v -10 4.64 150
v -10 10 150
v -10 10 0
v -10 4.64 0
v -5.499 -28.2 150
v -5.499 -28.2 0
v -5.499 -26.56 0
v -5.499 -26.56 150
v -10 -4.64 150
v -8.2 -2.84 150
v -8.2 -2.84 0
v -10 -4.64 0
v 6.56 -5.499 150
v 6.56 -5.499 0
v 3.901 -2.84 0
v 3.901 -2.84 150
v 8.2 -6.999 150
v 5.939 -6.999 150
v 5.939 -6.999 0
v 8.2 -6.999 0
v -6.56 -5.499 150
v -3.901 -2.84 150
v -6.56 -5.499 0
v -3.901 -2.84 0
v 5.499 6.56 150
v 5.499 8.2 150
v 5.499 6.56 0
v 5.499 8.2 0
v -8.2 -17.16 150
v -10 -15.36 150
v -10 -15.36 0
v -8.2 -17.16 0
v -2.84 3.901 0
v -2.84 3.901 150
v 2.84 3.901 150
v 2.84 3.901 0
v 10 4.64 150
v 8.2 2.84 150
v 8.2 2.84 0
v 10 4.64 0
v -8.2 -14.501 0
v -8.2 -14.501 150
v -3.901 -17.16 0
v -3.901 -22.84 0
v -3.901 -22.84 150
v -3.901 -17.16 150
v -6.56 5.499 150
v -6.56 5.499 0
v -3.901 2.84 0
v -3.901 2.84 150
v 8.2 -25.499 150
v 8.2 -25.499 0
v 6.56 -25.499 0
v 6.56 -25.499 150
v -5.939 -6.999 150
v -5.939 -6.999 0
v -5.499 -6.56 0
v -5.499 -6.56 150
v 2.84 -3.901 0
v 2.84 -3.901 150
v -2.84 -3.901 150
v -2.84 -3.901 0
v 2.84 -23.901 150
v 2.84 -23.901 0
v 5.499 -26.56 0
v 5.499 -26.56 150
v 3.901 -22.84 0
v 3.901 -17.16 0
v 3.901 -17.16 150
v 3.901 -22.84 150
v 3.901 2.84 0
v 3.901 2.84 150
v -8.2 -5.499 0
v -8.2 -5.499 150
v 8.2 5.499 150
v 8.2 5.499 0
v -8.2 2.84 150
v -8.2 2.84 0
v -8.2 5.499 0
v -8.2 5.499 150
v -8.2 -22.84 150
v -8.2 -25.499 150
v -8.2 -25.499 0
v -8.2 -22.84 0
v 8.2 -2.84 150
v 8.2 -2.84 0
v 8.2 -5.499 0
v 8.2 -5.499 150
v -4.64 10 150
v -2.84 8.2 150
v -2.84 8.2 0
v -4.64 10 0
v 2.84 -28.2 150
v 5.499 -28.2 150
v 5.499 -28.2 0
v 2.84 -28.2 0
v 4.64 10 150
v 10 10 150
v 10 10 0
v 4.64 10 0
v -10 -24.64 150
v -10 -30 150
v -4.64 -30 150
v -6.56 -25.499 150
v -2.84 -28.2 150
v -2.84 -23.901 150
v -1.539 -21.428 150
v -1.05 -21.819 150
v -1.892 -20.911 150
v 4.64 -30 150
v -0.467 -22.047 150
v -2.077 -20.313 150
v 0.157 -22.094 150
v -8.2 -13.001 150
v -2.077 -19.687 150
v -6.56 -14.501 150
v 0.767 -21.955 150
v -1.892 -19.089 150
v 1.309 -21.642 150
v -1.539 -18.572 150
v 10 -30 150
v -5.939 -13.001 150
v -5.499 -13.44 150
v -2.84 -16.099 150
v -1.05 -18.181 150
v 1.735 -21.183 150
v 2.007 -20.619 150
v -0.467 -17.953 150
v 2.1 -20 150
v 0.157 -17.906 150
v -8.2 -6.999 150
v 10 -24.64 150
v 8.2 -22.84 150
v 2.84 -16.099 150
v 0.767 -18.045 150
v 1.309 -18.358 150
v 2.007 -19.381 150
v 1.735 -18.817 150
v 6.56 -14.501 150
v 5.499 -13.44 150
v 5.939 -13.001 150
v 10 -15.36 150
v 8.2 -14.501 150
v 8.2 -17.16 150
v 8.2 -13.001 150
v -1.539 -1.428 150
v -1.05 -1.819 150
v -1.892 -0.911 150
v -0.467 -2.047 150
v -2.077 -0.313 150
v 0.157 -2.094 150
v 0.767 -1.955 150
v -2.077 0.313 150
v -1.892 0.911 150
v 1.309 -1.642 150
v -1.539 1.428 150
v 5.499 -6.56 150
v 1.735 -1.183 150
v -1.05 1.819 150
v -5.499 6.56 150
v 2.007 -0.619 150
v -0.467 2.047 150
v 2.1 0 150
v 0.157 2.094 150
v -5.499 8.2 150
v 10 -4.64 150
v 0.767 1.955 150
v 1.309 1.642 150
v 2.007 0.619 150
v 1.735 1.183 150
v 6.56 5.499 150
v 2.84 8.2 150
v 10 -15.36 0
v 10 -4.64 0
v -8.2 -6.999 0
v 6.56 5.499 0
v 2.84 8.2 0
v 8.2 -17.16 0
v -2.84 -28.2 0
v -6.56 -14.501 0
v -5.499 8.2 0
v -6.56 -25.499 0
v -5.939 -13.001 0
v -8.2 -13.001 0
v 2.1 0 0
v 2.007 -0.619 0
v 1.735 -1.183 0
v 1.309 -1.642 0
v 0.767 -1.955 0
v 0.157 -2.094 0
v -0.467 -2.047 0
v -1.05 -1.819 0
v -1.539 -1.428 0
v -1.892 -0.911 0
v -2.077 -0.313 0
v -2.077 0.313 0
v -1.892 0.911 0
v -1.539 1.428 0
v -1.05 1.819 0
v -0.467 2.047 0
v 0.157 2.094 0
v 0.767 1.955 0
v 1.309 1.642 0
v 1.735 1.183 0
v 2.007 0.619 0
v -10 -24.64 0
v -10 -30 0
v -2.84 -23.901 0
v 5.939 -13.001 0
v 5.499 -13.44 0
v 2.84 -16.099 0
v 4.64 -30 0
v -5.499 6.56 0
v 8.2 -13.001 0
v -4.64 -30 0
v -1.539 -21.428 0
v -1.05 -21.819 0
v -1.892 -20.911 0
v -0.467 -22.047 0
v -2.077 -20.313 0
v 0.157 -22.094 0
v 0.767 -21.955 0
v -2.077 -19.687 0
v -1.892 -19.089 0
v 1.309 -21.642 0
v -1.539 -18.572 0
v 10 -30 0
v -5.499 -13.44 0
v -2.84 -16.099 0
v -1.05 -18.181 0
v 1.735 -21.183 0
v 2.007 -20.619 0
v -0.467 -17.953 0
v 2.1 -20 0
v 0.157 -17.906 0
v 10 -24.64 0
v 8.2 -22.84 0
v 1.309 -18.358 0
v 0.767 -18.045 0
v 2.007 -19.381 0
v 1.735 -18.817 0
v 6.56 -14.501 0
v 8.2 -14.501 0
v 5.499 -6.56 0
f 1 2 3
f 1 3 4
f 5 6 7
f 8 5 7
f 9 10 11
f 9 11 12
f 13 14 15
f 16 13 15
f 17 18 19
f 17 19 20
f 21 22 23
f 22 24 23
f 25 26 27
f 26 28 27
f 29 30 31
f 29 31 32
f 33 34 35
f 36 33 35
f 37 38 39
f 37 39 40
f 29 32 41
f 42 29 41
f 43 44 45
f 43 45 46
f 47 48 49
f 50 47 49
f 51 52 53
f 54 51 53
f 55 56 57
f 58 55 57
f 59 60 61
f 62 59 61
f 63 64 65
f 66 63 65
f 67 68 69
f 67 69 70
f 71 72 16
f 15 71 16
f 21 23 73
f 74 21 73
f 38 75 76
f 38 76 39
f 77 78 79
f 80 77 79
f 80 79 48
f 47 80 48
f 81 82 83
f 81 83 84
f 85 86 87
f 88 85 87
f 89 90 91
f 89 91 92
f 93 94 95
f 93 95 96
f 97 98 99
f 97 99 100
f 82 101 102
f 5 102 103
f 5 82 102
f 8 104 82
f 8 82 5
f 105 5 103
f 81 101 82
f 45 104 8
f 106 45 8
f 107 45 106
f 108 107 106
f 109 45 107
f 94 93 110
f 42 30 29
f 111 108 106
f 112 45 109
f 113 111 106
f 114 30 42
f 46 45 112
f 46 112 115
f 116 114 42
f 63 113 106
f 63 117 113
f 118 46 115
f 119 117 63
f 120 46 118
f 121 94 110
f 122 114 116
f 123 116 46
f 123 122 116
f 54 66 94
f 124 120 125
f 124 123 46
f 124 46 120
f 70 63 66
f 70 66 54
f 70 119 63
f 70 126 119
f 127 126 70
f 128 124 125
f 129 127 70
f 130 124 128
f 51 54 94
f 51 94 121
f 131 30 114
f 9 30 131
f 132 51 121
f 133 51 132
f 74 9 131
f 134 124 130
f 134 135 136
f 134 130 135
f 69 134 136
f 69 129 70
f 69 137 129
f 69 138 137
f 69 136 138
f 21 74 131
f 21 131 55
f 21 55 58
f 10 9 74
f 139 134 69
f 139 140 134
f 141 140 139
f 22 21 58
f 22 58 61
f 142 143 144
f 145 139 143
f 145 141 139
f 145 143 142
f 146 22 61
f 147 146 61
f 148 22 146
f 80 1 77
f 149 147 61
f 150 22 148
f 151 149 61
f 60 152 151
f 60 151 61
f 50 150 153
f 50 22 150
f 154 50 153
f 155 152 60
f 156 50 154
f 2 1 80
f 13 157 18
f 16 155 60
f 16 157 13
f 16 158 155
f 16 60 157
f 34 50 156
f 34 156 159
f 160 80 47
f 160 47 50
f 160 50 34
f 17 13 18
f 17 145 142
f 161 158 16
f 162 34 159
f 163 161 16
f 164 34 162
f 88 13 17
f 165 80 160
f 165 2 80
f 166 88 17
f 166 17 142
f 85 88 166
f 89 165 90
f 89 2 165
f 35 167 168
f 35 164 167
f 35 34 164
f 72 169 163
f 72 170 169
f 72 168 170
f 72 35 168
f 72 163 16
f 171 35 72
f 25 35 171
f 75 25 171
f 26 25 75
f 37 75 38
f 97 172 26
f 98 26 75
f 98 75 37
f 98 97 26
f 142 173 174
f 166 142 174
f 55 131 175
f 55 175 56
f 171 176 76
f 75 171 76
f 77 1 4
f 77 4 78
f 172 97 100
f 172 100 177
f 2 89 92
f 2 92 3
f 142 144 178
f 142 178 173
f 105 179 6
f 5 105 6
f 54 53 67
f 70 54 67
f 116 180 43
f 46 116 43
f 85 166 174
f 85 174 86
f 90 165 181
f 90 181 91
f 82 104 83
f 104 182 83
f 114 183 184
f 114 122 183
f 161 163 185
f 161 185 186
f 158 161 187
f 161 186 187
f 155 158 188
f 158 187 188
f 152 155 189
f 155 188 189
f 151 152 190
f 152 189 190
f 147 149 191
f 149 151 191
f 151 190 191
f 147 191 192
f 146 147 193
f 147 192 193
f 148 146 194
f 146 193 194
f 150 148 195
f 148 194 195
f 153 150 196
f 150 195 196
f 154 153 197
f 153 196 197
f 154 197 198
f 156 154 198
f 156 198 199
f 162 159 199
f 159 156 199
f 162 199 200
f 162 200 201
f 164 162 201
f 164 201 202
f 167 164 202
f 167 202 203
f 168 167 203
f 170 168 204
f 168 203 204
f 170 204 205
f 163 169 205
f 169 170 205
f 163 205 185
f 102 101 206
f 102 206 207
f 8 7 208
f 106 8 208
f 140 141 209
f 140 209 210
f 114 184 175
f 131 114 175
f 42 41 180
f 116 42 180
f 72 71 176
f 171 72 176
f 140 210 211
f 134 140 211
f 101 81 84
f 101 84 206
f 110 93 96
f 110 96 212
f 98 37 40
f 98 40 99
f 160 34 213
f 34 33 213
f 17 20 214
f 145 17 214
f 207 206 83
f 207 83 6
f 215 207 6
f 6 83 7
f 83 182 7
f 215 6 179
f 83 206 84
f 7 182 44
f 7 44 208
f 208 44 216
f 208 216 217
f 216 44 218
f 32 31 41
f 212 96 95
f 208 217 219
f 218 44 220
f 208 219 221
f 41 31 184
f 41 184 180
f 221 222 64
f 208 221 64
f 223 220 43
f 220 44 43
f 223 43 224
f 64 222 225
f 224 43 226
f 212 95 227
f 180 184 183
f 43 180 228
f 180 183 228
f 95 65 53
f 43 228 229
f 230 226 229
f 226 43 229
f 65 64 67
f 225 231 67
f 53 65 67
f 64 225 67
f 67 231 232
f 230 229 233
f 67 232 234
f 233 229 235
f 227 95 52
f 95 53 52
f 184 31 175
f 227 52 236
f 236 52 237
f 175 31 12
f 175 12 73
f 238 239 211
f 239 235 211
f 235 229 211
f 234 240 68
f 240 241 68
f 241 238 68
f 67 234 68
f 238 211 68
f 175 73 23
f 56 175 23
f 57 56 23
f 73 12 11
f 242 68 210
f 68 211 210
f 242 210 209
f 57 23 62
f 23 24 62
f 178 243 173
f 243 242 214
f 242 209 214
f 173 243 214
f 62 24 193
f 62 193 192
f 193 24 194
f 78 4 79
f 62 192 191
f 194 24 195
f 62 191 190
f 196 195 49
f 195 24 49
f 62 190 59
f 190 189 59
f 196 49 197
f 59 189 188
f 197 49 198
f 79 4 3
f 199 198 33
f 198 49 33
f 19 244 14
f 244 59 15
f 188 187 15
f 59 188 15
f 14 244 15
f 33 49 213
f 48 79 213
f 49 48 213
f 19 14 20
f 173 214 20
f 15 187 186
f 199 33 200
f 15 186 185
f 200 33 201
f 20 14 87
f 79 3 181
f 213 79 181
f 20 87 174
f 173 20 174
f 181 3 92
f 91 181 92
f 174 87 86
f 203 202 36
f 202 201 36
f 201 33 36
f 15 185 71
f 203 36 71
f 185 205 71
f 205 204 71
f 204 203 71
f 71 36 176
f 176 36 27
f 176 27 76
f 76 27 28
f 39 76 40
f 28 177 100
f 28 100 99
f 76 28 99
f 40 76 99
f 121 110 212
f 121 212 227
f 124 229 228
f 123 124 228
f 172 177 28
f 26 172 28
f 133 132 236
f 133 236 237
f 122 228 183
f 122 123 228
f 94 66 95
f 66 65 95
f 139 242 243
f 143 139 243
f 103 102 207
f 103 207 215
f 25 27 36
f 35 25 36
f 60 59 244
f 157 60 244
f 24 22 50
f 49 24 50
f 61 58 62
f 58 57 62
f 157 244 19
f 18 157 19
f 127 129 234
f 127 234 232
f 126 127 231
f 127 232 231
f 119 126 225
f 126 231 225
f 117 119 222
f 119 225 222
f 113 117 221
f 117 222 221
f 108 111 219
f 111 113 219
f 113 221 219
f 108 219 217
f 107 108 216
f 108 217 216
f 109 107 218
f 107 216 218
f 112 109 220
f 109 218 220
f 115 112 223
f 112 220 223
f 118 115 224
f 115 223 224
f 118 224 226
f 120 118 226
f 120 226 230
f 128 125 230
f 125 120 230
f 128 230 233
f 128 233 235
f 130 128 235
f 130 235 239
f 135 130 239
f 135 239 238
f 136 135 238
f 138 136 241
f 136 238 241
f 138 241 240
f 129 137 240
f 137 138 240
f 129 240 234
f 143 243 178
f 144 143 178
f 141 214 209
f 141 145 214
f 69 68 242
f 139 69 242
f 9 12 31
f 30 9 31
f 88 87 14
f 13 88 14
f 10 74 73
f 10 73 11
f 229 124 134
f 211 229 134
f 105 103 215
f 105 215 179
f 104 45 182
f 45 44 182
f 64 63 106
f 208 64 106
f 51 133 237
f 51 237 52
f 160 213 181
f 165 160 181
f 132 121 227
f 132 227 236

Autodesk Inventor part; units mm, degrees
ref_plane "YZ Plane" through (0, 0, 0) normal (1, 0, 0) x (0, 1, 0)
ref_plane "XY Plane" through (0, 0, 0) normal (0, 0, 1) x (1, 0, 0)
sketch "Sketch1" plane through (0, 0, 0) normal (0, 0, 1) x (1, 0, 0)
  line L0 (-3.9007, 3.9007) -> (3.9007, 3.9007)
  line L1 (3.9007, 3.9007) -> (3.9007, -3.9007)
  line L2 (3.9007, -3.9007) -> (-3.9007, -3.9007)
  line L3 (-3.9007, -3.9007) -> (-3.9007, 3.9007)
  line L4 (0, 3.9007) -> (0, -3.9007) construction
  line L5 (-3.9007, 0) -> (3.9007, 0) construction
  circle A0 centre (0, 0) radius 2.1
  line L6 (0, 0) -> (-16.1173, 16.1173) construction
  line L7 (0, 0) -> (22.7933, 0) construction
  line L8 (-2.84, 3.9007) -> (-5.4993, 6.56)
  line L9 (-5.4993, 6.56) -> (-5.4993, 8.2)
  line L10 (-5.4993, 8.2) -> (-2.84, 8.2)
  line L11 (-2.84, 8.2) -> (-4.64, 10)
  line L12 (-4.64, 10) -> (-10, 10)
  line L13 (-10, 10) -> (-10, 4.64)
  line L14 (-10, 4.64) -> (-8.2, 2.84)
  line L15 (-8.2, 2.84) -> (-8.2, 5.4993)
  line L16 (-8.2, 5.4993) -> (-6.56, 5.4993)
  line L17 (-6.56, 5.4993) -> (-3.9007, 2.84)
  line L18 (-3.9007, 2.84) -> (-11.3102, 2.84) construction
  line L19 (-2.84, 3.9007) -> (-3.9007, 3.9007)
  line L20 (-3.9007, 2.84) -> (-3.9007, 3.9007)
  line L21 (-3.9007, -2.84) -> (-6.56, -5.4993)
  line L22 (-6.56, -5.4993) -> (-8.2, -5.4993)
  line L23 (-8.2, -5.4993) -> (-8.2, -2.84)
  line L24 (-8.2, -2.84) -> (-10, -4.64)
  line L25 (-10, -4.64) -> (-10, -10)
  line L26 (-10, -10) -> (-4.64, -10)
  line L27 (-4.64, -10) -> (-2.84, -8.2)
  line L28 (-2.84, -8.2) -> (-5.4993, -8.2)
  line L29 (-5.4993, -8.2) -> (-5.4993, -6.56)
  line L30 (-5.4993, -6.56) -> (-2.84, -3.9007)
  line L31 (-3.9007, -2.84) -> (-3.9007, -3.9007)
  line L32 (-2.84, -3.9007) -> (-3.9007, -3.9007)
  line L33 (2.84, -3.9007) -> (5.4993, -6.56)
  line L34 (5.4993, -6.56) -> (5.4993, -8.2)
  line L35 (5.4993, -8.2) -> (2.84, -8.2)
  line L36 (2.84, -8.2) -> (4.64, -10)
  line L37 (4.64, -10) -> (10, -10)
  line L38 (10, -10) -> (10, -4.64)
  line L39 (10, -4.64) -> (8.2, -2.84)
  line L40 (8.2, -2.84) -> (8.2, -5.4993)
  line L41 (8.2, -5.4993) -> (6.56, -5.4993)
  line L42 (6.56, -5.4993) -> (3.9007, -2.84)
  line L43 (2.84, -3.9007) -> (3.9007, -3.9007)
  line L44 (3.9007, -2.84) -> (3.9007, -3.9007)
  line L45 (3.9007, 2.84) -> (6.56, 5.4993)
  line L46 (6.56, 5.4993) -> (8.2, 5.4993)
  line L47 (8.2, 5.4993) -> (8.2, 2.84)
  line L48 (8.2, 2.84) -> (10, 4.64)
  line L49 (10, 4.64) -> (10, 10)
  line L50 (10, 10) -> (4.64, 10)
  line L51 (4.64, 10) -> (2.84, 8.2)
  line L52 (2.84, 8.2) -> (5.4993, 8.2)
  line L53 (5.4993, 8.2) -> (5.4993, 6.56)
  line L54 (5.4993, 6.56) -> (2.84, 3.9007)
  line L55 (3.9007, 2.84) -> (3.9007, 3.9007)
  line L56 (2.84, 3.9007) -> (3.9007, 3.9007)
  dimension "d7" = 4.2
  dimension "d8" = 135
  dimension "d9" = 1.5
  dimension "d10" = 1.64
  dimension "d11" = 1.8
  dimension "d12" = 2.84
  dimension "d13" = 10
  dimension "d16" = 360
extrude "Extrusion1" add sketch "Sketch1" along normal blind 150
pattern_linear "Rectangular Pattern1" count 2 spacing 20 along (0, -1, 0) of "Extrusion1"
sketch "Sketch2" plane through (0, 0, 150) normal (0, 0, 1) x (1, 0, 0)
  line L0 (8.2, -2.84) -> (8.2, -5.4993) projected
  line L1 (8.2, -5.4993) -> (6.56, -5.4993) projected
  line L2 (-6.56, -5.4993) -> (-8.2, -5.4993) projected
  line L3 (-8.2, -5.4993) -> (-8.2, -2.84) projected
  line L4 (-8.2, -14.5007) -> (-6.56, -14.5007) projected
  line L5 (6.56, -14.5007) -> (8.2, -14.5007) projected
  line L6 (5.4993, -11.8) -> (5.4993, -13.44) projected
  line L7 (5.4993, -13.44) -> (2.84, -16.0993) projected
  line L8 (-2.84, -16.0993) -> (-5.4993, -13.44) projected
  line L9 (-5.4993, -8.2) -> (-5.4993, -6.56) projected
  line L10 (-5.4993, -6.56) -> (-2.84, -3.9007) projected
  line L11 (2.84, -3.9007) -> (5.4993, -6.56) projected
  line L12 (2.84, -8.2) -> (4.64, -10) projected
  line L13 (-8.2, -6.9993) -> (-5.9387, -6.9993)
  line L14 (-5.9387, -6.9993) -> (-4.1231, -5.1837)
  line L15 (-4.1231, -5.1837) -> (4.1231, -5.1837)
  line L16 (4.1231, -5.1837) -> (5.9387, -6.9993)
  line L17 (5.9387, -6.9993) -> (8.2, -6.9993)
  line L18 (8.2, -6.9993) -> (8.2, -13.0007)
  line L19 (8.2, -13.0007) -> (5.9387, -13.0007)
  line L20 (5.9387, -13.0007) -> (4.2461, -14.6932)
  line L21 (4.2461, -14.6932) -> (-4.2461, -14.6932)
  line L22 (-4.2461, -14.6932) -> (-5.9387, -13.0007)
  line L23 (-5.9387, -13.0007) -> (-8.2, -13.0007)
  line L24 (-8.2, -13.0007) -> (-8.2, -6.9993)
  dimension "d23" = 1.5
  dimension "d24" = 1.5
  dimension "d25" = 1.5
  dimension "d26" = 1.5
extrude "Extrusion2" cut sketch "Sketch2" against normal up to next
ref_plane "Work Plane5" through (0, -10, 0) normal (0, 1, 0) x (-1, 0, 0)
equation "\"d24\" = d23"
equation "\"d25\" = d23"
equation "\"d26\" = d23"
properties part number "20x40x597mm" material "Aluminum 6061"
